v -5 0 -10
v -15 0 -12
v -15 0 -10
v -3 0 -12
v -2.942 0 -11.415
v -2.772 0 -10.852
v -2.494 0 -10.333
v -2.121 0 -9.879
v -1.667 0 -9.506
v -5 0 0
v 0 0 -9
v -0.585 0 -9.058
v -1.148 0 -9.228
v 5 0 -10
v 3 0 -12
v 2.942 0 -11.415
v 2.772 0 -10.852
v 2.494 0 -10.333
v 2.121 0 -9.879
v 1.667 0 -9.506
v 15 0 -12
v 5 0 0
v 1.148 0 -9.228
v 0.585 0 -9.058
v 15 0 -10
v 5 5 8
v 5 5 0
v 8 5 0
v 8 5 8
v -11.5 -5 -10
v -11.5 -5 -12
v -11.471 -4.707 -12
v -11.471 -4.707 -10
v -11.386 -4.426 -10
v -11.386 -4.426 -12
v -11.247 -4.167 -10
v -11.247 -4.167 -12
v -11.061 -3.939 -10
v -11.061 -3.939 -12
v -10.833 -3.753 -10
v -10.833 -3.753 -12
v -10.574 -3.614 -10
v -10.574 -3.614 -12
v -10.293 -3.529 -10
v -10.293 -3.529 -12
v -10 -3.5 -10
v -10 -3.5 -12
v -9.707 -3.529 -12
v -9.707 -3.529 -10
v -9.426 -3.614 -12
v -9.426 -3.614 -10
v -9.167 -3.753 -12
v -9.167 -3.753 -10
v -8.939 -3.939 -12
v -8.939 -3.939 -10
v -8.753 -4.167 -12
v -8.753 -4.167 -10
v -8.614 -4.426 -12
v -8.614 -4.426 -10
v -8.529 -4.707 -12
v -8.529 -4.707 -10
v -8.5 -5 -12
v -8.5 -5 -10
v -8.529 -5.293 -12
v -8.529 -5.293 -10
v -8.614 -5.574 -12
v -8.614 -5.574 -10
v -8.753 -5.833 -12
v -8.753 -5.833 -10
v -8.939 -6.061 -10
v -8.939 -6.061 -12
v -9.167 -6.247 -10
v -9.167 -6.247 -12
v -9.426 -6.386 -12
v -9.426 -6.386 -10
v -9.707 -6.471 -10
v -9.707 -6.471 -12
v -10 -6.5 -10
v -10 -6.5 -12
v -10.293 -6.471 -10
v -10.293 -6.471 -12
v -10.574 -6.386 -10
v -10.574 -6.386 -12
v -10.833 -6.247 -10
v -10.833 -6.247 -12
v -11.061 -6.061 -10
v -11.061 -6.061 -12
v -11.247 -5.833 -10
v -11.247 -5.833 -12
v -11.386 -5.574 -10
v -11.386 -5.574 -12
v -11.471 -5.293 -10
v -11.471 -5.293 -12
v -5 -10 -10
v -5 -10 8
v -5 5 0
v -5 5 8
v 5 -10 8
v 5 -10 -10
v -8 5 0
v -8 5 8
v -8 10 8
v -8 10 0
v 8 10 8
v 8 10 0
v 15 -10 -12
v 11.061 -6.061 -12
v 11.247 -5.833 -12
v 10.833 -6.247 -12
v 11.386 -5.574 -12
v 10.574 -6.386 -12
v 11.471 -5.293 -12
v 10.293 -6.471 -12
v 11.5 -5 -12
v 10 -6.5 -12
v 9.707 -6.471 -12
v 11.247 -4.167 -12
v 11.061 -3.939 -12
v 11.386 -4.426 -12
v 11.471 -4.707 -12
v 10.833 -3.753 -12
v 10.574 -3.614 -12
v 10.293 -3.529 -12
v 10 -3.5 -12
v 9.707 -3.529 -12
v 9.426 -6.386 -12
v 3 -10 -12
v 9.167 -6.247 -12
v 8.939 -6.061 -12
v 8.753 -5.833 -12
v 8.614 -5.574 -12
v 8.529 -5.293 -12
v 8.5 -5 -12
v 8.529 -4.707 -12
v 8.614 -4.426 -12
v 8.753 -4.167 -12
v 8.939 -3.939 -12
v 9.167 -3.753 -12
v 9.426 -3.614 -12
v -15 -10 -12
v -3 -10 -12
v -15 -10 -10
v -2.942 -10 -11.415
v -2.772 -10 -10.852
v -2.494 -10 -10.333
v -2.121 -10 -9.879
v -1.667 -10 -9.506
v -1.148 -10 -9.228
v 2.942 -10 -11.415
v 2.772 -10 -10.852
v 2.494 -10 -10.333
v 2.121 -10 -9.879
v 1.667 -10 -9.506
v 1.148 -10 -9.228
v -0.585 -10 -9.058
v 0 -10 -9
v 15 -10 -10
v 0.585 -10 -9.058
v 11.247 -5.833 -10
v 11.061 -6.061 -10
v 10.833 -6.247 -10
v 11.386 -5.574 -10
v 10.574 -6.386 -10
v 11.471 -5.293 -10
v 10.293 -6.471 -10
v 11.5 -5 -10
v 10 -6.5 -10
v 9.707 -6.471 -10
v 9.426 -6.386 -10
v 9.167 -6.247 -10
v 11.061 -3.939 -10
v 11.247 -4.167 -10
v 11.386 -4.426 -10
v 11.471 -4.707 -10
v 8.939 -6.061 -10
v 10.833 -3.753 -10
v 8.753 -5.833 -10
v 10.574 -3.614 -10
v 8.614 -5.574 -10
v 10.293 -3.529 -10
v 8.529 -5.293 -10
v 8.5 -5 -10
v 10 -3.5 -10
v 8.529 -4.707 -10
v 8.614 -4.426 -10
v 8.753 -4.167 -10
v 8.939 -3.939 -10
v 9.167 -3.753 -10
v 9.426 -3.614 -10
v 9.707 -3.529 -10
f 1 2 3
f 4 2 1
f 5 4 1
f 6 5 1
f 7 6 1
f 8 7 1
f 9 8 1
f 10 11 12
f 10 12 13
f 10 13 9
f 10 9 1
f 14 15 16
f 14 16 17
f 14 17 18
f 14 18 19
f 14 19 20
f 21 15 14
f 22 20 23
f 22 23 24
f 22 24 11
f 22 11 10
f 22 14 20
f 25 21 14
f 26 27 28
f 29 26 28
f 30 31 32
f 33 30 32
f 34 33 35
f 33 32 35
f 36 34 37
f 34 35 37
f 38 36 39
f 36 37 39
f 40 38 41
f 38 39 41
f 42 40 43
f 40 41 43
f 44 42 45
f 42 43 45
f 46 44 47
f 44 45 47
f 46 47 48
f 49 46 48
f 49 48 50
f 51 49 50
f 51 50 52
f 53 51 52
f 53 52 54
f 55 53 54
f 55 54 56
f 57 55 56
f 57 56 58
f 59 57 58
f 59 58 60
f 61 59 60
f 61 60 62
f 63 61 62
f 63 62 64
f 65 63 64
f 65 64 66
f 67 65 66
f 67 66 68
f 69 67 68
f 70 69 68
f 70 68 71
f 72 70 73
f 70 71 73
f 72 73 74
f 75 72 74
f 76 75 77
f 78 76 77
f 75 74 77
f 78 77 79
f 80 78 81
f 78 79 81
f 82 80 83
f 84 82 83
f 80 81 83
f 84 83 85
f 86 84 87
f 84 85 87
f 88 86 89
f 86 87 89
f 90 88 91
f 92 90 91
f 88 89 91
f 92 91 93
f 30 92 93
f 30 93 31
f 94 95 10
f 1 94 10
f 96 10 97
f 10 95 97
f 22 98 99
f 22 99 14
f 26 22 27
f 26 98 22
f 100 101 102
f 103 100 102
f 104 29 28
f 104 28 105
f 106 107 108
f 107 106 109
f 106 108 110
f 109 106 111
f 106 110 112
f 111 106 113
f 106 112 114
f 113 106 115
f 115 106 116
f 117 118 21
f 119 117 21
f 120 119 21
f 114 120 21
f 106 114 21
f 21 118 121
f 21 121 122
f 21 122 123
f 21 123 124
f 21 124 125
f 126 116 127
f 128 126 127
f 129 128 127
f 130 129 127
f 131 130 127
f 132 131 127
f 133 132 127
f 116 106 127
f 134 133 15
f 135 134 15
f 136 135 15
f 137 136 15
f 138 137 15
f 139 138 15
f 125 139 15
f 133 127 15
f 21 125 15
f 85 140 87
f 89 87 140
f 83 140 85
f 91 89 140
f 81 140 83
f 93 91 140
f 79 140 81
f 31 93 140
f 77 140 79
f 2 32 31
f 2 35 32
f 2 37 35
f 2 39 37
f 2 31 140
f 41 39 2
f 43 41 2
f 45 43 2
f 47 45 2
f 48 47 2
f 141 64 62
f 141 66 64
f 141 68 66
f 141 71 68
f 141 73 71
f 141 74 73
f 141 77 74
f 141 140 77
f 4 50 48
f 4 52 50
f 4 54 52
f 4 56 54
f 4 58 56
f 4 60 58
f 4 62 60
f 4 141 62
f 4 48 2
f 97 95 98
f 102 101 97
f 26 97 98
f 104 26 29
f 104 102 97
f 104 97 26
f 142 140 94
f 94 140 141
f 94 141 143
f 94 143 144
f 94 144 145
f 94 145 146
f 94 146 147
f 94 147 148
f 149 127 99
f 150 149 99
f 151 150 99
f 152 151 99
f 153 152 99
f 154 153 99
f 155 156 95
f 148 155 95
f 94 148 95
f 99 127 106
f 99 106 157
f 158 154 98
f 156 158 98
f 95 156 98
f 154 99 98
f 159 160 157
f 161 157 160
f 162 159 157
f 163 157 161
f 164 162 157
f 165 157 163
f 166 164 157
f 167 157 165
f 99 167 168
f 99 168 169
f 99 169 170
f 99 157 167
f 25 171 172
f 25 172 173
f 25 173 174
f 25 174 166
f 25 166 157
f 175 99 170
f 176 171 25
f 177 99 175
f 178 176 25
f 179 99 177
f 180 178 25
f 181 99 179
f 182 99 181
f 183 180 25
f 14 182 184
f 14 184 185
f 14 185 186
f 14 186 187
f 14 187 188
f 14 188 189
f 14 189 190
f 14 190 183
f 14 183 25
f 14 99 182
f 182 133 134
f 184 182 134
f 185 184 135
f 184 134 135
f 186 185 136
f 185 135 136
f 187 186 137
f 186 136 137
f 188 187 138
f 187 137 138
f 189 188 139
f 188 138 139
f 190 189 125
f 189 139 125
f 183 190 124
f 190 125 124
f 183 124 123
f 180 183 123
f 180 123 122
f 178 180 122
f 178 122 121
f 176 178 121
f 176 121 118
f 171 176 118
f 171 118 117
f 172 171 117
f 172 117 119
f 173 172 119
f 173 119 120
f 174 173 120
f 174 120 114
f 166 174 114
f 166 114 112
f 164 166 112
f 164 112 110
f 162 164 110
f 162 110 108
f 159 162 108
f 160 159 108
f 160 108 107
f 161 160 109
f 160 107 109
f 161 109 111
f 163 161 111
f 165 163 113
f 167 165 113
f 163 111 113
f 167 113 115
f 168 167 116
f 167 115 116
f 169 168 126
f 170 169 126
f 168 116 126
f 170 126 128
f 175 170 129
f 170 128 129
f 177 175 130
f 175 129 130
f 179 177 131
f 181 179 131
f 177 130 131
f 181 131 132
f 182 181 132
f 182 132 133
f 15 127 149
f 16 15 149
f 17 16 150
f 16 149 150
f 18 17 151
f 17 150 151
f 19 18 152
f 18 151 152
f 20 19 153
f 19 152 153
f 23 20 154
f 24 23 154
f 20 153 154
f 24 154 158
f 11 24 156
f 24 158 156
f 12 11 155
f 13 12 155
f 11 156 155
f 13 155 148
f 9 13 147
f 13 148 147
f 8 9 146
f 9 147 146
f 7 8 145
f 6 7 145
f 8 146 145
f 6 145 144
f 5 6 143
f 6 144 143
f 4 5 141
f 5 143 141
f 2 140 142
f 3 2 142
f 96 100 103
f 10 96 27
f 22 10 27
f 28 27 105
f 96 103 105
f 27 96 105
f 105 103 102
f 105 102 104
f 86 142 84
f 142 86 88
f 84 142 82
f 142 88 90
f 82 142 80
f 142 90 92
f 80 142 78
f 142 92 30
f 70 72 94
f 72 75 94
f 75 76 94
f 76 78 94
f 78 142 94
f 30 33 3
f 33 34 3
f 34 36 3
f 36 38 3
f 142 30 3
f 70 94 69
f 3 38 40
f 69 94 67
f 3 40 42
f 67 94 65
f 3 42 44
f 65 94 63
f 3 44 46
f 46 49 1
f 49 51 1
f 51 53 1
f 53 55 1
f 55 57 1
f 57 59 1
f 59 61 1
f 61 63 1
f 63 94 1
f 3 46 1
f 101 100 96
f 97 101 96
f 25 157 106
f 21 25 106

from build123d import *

# Parameters (mm, degrees)
SKETCH3_W           = 16
SKETCH3_H           = 20
BOSS_EXTRUDE1_DEPTH = 8
SKETCH4_W           = 3
SKETCH4_H           = 15
CUT_EXTRUDE1_DEPTH  = 8
SKETCH5_W           = 10
SKETCH5_H           = 10
BOSS_EXTRUDE2_DEPTH = 12
SKETCH6_R           = 3
CUT_EXTRUDE2_DEPTH  = 14
SKETCH8_W           = 2
SKETCH8_H           = 10
BOSS_EXTRUDE3_DEPTH = 10
SKETCH9_W           = 2
SKETCH9_H           = 10
BOSS_EXTRUDE4_DEPTH = 10
SKETCH10_R          = 1.5
CUT_EXTRUDE3_DEPTH  = 10


with BuildPart() as part:
    # Sketch3 → Boss-Extrude1 (new body)
    with BuildSketch(Plane.XY):
        Rectangle(SKETCH3_W, SKETCH3_H)
    extrude(amount=BOSS_EXTRUDE1_DEPTH)

    # Sketch4 → Cut-Extrude1 (cut)
    with BuildSketch(Plane.XY.offset(8)):
        with Locations((-6.5, -2.5)):
            Rectangle(SKETCH4_W, SKETCH4_H)
        with Locations((6.5, -2.5)):
            Rectangle(SKETCH4_W, SKETCH4_H)
    extrude(amount=-CUT_EXTRUDE1_DEPTH, mode=Mode.SUBTRACT)

    # Sketch5 → Boss-Extrude2 (add)
    with BuildSketch(Plane(origin=(0, 0, 0), x_dir=(-1, 0, 0), z_dir=(0, 0, -1))):
        with Locations((0, -5)):
            Rectangle(SKETCH5_W, SKETCH5_H)
    extrude(amount=BOSS_EXTRUDE2_DEPTH)

    # Sketch6 → Cut-Extrude2 (cut)
    with BuildSketch(Plane.XZ.offset(10)):
        with Locations((0, -12)):
            Circle(SKETCH6_R)
    extrude(amount=-CUT_EXTRUDE2_DEPTH, mode=Mode.SUBTRACT)

    # Sketch8 → Boss-Extrude3 (add)
    with BuildSketch(Plane(origin=(5, 0, 0), x_dir=(0, 0, -1), z_dir=(1, 0, 0))):
        with Locations((11, -5)):
            Rectangle(SKETCH8_W, SKETCH8_H)
    extrude(amount=BOSS_EXTRUDE3_DEPTH)

    # Sketch9 → Boss-Extrude4 (add)
    with BuildSketch(Plane.ZY.offset(5)):
        with Locations((-11, -5)):
            Rectangle(SKETCH9_W, SKETCH9_H)
    extrude(amount=BOSS_EXTRUDE4_DEPTH)

    # Sketch10 → Cut-Extrude3 (cut)
    with BuildSketch(Plane(origin=(0, 0, -12), x_dir=(-1, 0, 0), z_dir=(0, 0, -1))):
        with Locations((-10, -5)):
            Circle(SKETCH10_R)
        with Locations((10, -5)):
            Circle(SKETCH10_R)
    extrude(amount=-CUT_EXTRUDE3_DEPTH, mode=Mode.SUBTRACT)


solid = part.part
